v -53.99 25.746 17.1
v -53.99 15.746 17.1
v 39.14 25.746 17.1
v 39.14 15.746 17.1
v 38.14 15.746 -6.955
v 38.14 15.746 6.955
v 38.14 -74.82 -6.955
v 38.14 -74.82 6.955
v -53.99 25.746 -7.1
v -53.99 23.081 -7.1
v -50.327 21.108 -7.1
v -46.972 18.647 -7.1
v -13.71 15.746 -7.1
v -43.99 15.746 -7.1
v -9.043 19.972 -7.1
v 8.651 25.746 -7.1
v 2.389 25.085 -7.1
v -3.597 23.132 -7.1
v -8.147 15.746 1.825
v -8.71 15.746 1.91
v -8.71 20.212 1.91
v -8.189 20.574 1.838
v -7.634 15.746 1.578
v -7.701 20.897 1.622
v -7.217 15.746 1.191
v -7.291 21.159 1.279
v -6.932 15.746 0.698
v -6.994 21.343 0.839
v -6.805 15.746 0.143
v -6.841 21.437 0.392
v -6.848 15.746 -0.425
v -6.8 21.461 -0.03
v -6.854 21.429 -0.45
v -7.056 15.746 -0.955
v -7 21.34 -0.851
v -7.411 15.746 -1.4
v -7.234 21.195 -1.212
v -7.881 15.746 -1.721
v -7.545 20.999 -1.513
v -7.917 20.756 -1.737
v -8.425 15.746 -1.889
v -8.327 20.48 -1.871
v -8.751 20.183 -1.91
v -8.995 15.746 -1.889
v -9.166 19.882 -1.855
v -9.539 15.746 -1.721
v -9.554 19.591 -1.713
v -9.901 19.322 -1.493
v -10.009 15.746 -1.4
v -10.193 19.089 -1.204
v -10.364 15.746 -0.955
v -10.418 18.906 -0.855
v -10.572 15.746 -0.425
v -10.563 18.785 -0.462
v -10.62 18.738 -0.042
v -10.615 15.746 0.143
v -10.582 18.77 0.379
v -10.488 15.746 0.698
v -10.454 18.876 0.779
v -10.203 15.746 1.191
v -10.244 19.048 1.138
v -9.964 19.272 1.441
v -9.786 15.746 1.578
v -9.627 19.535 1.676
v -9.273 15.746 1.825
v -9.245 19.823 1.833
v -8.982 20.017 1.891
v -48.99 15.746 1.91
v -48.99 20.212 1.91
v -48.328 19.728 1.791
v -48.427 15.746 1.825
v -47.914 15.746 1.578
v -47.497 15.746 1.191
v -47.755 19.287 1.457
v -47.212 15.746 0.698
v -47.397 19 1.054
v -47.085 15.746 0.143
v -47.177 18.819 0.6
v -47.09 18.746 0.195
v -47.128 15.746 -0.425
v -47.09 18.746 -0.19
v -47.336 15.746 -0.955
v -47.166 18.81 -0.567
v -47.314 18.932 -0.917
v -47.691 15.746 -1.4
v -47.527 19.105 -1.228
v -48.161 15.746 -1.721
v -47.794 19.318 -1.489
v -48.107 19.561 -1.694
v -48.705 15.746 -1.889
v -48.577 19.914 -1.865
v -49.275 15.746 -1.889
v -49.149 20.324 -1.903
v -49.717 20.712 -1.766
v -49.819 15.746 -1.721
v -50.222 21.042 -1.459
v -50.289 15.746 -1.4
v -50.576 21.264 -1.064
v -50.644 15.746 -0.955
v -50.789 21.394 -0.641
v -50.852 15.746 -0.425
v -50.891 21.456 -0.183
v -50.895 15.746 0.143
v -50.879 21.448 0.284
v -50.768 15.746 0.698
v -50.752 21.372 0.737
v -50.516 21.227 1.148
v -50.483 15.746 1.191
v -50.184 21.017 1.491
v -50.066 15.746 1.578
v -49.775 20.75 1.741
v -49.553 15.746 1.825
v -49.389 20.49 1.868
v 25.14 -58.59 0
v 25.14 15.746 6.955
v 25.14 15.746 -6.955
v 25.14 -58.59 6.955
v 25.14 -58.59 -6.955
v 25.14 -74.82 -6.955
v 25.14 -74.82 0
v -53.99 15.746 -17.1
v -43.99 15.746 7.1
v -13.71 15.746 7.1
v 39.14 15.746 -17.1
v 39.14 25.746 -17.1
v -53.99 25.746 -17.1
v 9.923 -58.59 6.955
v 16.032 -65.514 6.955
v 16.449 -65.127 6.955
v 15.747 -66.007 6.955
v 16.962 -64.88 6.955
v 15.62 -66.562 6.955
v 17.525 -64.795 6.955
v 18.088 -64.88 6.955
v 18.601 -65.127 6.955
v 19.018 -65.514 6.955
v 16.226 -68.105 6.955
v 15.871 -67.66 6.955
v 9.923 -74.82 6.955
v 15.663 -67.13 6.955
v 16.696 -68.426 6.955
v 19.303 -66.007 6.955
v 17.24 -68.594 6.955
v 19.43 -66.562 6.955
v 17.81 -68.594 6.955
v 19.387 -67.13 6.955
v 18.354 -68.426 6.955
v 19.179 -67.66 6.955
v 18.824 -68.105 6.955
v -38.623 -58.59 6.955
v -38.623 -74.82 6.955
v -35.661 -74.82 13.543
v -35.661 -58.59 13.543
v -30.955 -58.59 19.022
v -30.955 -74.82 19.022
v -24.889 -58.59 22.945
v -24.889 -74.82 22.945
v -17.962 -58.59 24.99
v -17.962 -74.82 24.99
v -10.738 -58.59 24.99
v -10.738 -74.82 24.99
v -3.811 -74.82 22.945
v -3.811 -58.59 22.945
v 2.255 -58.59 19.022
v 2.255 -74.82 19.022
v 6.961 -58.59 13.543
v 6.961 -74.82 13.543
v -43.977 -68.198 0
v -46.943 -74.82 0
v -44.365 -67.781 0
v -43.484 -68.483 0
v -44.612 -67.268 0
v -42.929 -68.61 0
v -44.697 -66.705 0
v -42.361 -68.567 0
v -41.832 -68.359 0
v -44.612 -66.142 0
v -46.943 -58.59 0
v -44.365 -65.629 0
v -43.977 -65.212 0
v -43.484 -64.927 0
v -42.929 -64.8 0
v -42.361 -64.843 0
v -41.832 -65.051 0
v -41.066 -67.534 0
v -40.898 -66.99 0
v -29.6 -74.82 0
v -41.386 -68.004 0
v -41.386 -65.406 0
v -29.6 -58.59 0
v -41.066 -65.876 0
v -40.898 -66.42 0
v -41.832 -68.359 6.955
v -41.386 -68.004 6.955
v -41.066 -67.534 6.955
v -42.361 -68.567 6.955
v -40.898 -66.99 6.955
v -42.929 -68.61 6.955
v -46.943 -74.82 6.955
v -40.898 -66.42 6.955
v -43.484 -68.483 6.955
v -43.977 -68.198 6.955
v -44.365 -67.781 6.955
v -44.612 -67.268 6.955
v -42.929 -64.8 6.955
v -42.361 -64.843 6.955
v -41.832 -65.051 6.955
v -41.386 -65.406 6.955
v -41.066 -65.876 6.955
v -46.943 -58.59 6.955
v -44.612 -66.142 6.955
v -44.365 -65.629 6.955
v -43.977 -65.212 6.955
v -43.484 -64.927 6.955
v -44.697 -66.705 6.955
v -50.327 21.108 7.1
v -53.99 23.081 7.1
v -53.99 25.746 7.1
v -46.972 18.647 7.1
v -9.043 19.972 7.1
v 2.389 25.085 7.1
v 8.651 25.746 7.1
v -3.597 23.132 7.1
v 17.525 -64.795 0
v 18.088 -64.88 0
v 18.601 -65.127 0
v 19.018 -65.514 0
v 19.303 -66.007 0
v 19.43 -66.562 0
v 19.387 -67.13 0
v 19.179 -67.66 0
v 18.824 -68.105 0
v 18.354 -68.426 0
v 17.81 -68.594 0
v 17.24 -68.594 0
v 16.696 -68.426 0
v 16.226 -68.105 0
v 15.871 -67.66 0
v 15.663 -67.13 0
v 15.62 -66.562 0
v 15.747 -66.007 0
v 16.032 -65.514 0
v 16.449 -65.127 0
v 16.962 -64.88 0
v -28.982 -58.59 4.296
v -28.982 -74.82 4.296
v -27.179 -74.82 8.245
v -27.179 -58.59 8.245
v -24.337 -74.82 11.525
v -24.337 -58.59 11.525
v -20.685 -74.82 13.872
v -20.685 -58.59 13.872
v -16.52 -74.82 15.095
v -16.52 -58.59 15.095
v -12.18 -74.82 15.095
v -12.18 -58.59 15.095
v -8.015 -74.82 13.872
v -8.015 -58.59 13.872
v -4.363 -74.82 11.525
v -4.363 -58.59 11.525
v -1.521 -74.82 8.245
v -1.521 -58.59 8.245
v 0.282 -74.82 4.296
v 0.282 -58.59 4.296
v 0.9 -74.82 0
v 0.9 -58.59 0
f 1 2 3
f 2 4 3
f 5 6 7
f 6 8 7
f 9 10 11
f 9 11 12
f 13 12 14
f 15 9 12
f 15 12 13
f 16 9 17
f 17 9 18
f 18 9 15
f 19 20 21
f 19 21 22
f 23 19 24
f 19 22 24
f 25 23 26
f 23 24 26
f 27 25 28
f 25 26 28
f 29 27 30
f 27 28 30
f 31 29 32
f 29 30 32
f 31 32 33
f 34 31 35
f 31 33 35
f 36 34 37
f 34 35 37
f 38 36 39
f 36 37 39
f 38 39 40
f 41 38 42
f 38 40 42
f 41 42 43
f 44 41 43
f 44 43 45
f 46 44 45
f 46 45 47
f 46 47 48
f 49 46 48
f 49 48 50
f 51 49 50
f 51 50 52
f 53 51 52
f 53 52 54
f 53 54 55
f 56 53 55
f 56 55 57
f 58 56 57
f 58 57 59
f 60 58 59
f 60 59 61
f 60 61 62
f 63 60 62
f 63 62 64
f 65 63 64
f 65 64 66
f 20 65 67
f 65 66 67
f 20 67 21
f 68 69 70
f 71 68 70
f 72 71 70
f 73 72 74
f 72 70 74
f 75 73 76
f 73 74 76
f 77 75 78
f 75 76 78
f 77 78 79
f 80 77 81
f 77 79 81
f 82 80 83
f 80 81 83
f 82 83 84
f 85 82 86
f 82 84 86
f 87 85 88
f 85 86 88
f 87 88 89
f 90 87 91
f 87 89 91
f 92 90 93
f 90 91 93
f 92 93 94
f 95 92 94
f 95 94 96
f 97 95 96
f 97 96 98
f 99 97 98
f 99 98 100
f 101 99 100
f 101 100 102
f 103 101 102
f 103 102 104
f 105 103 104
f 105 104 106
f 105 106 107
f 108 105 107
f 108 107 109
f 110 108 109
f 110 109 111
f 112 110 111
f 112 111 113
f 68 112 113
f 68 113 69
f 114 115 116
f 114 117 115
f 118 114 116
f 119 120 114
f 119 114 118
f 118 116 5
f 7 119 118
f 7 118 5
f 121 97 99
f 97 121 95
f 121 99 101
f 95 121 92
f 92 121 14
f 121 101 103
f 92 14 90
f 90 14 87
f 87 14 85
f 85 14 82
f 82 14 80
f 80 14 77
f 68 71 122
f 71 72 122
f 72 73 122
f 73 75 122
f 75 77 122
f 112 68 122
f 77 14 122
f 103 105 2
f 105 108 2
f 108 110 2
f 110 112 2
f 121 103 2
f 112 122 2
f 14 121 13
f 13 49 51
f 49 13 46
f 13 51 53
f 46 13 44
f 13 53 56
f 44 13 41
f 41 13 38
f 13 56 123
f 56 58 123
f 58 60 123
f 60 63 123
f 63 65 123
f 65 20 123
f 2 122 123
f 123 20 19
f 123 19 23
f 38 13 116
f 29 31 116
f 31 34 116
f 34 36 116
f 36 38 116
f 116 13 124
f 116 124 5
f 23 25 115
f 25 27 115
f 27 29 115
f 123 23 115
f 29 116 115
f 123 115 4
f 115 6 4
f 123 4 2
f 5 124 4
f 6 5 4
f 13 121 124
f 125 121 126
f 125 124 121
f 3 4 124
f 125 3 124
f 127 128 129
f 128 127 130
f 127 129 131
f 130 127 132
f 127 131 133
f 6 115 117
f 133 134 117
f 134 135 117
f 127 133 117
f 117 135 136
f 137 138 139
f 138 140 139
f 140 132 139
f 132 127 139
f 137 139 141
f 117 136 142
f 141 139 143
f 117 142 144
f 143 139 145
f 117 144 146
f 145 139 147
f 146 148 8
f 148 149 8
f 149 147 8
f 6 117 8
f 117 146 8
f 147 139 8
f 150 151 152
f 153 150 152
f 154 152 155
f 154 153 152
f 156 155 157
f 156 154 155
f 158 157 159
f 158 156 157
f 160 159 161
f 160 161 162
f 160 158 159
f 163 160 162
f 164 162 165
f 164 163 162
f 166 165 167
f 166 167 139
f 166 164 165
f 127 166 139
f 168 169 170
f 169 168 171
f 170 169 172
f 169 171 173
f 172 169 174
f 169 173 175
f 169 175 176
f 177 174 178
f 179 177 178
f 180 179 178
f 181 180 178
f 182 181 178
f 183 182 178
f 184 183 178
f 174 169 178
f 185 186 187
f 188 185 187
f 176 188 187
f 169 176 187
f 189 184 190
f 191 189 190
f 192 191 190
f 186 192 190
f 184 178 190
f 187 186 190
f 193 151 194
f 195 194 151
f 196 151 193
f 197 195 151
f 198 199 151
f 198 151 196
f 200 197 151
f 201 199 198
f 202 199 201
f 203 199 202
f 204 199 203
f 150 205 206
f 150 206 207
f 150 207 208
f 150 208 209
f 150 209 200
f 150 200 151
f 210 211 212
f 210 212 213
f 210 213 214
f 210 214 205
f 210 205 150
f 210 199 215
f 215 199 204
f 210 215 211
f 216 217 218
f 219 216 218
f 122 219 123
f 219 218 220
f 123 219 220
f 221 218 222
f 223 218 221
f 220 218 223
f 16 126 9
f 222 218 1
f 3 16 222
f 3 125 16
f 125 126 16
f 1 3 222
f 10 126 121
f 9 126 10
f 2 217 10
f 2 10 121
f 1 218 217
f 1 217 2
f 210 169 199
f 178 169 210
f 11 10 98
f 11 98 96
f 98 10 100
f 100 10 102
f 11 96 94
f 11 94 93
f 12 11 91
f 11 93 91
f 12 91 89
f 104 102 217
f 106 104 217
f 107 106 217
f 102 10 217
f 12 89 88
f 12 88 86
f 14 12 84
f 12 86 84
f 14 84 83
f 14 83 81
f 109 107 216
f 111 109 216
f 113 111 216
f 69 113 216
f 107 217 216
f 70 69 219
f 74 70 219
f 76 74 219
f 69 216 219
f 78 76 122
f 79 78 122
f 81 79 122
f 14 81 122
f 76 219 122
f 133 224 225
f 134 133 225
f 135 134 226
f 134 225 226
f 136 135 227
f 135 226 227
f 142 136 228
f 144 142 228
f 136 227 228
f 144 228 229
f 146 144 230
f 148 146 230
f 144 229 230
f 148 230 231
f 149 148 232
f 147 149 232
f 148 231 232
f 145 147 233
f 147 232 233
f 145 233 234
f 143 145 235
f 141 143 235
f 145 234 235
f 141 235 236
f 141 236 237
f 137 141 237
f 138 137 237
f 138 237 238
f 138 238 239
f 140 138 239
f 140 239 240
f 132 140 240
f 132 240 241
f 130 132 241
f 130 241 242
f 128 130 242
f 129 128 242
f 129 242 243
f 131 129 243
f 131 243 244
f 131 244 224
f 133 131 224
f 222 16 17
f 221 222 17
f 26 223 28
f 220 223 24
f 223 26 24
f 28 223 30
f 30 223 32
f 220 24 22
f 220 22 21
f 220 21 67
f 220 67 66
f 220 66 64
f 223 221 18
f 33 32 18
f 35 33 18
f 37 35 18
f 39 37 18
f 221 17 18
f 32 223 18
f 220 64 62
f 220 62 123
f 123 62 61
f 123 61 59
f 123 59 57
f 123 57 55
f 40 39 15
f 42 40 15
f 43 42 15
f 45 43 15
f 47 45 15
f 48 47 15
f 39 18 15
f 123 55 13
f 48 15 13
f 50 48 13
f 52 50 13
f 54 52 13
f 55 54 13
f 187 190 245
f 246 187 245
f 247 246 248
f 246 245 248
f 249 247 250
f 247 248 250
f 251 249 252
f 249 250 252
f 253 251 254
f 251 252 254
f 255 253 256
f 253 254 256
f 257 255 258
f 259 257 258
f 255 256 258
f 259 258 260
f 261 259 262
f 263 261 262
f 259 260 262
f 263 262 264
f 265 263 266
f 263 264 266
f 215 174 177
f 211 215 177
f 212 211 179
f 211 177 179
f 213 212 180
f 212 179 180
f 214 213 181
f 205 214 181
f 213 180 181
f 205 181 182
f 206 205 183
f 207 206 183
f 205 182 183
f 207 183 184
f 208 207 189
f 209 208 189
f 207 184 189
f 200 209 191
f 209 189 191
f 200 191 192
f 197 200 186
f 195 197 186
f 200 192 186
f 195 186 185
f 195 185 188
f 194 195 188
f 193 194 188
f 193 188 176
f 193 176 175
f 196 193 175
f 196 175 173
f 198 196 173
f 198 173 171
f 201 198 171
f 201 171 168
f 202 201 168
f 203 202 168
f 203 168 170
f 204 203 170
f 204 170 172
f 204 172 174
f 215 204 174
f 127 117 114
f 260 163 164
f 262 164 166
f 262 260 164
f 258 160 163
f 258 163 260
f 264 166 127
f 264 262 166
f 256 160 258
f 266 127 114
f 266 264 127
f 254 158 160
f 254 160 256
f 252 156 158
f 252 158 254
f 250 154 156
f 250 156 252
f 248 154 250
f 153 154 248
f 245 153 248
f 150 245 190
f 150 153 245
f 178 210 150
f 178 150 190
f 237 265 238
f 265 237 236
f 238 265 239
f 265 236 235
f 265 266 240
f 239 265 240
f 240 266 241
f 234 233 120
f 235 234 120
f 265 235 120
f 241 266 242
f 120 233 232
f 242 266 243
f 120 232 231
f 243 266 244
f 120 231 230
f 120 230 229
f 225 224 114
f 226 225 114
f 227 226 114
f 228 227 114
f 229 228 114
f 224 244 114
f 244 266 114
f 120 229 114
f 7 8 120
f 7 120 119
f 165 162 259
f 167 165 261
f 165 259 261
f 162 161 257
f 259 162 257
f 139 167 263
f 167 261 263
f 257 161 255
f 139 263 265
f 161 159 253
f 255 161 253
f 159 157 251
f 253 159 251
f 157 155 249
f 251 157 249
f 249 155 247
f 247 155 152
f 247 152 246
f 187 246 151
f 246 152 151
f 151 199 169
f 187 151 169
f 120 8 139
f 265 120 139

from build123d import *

# Parameters (mm, degrees)
SKETCH_1_W                = 50.28
SKETCH_1_H                = 34.2
SKETCH_1_W_2              = 30.28
SKETCH_1_H_2              = 14.2
EXTRUDE_1_DEPTH           = 12.25
SKETCH_4_W                = 13
SKETCH_4_H                = 13.91
EXTRUDE_1_2_DEPTH         = 74.82
SKETCH_5_W                = 13.91
SKETCH_5_H                = 16.23
EXTRUDE_2_DEPTH           = 16
SKETCH_7_R                = 25.25
SKETCH_7_R_2              = 15.25
EXTRUDE_2_2_DEPTH         = 16.23
SKETCH_15_R               = 1.91
CUT_EXTRUDE_6_DEPTH       = 97.964478439
SKETCH_18_W               = 49.344544624
SKETCH_18_H               = 6.125
CUT_EXTRUDE_8_DEPTH       = 101.789238284
SKETCH_19_W               = 34.2
SKETCH_19_H               = 6.125
CUT_EXTRUDE_9_DEPTH       = 10
SKETCH_21_R               = 1.91
CUT_EXTRUDE_10_DEPTH      = 10
SKETCH_20_R               = 1.91
CUT_EXTRUDE_11_DEPTH      = 10
FILLET_START              = -7.1
FILLET_1_DEPTH            = 14.2
FILLET_2_DEPTH            = 14.2
SKETCH_29_W               = 13.91
SKETCH_29_H               = 74.82
EXTRUDE_5_DEPTH           = 10
SKETCH_30_W               = 10
SKETCH_30_H               = 58.59
CUT_EXTRUDE_13_DEPTH      = 97.964478439
SKETCH_32_W               = 34.2
SKETCH_32_H               = 5.745736365
EXTRUDE_6_DEPTH           = 10
CUT_EXTRUDE_16_DEPTH      = 50
CUT_EXTRUDE_16_DEPTH_BACK = 50
SKETCH_38_W               = 116.985630298
SKETCH_38_H               = 80.538350638
SKETCH_41_W               = 13.91
SKETCH_41_H               = 5.745736365
EXTRUDE_7_DEPTH           = 3
SKETCH_42_W               = 13
SKETCH_42_H               = 13.91
EXTRUDE_8_DEPTH           = 74.82
SKETCH_43_W               = 13.91
SKETCH_43_H               = 16.23
EXTRUDE_9_DEPTH           = 15.22
SKETCH_44_R               = 1.91
CUT_EXTRUDE_17_DEPTH      = 15.22
SKETCH_46_R               = 25.25
SKETCH_46_R_2             = 15.25
EXTRUDE_6_2_DEPTH         = 16.23
EXTRUDE_10_DEPTH          = 7.22
EXTRUDE_10_DEPTH_BACK     = 10
SKETCH_47_W               = 13.91
SKETCH_47_H               = 16.23
SKETCH_50_W               = 3.056753925
SKETCH_50_H               = 16.23
CUT_EXTRUDE_18_DEPTH      = 96.578211037
SKETCH_51_R               = 1.91
CUT_EXTRUDE_19_DEPTH      = 95.015226304
SKETCH_52_W               = 92.841945613
SKETCH_52_H               = 30
CUT_EXTRUDE_20_DEPTH      = 84.840694713
CUT_EXTRUDE_22_DEPTH      = 50
CUT_EXTRUDE_22_DEPTH_BACK = 50
SKETCH_53_W               = 63.541345486
SKETCH_53_H               = 14.170740414
SKETCH_54_W               = 10
SKETCH_54_H               = 10.145
CUT_EXTRUDE_23_DEPTH      = 50
SKETCH_55_W               = 13
SKETCH_55_H               = 13.91
EXTRUDE_11_DEPTH          = 10
SKETCH_57_W               = 15
SKETCH_57_H               = 34.2
EXTRUDE_12_DEPTH          = 10
SKETCH_58_W               = 34.2
SKETCH_58_H               = 10
EXTRUDE_13_DEPTH          = 27.85
SKETCH_60_W               = 34.2
SKETCH_60_H               = 10
EXTRUDE_14_DEPTH          = 50.28
SKETCH_62_W               = 30.28
SKETCH_62_H               = 14.2
CUT_EXTRUDE_24_DEPTH      = 50.28
SKETCH_64_R               = 1.91
CUT_EXTRUDE_25_DEPTH      = 10
FILLET_3_R                = 30


with BuildPart() as part:
    # 草圖1 → Extrude 1 (new body)
    with BuildSketch(Plane(origin=(0, 0, 0), x_dir=(1, 0, 0), z_dir=(0, 1, 0))):
        Rectangle(SKETCH_1_W, SKETCH_1_H)
        Rectangle(SKETCH_1_W_2, SKETCH_1_H_2, mode=Mode.SUBTRACT)
    extrude(amount=EXTRUDE_1_DEPTH)

    # 草圖4 → Extrude 1 2 (add)
    with BuildSketch(Plane.XZ):
        with Locations((18.64, 0)):
            Rectangle(SKETCH_4_W, SKETCH_4_H)
    extrude(amount=EXTRUDE_1_2_DEPTH)

    # 草圖5 → Extrude 2 (add)
    with BuildSketch(Plane.ZY.offset(-12.14)):
        with Locations((0, -66.705)):
            Rectangle(SKETCH_5_W, SKETCH_5_H)
    extrude(amount=EXTRUDE_2_DEPTH)

    # 草圖7 → Extrude 2 2 (add)
    with BuildSketch(Plane(origin=(3.626674765, -74.82, 0), x_dir=(1, 0, 0), z_dir=(0, -1, 0))):
        with Locations((-30.978154344, 0)):
            Circle(SKETCH_7_R)
        with Locations((-30.978154344, 0)):
            Circle(SKETCH_7_R_2, mode=Mode.SUBTRACT)
    extrude(amount=-EXTRUDE_2_2_DEPTH)

    # 草圖15 → 除料-伸長6 (cut, through all)
    with BuildSketch(Plane(origin=(0, 0, -6.955), x_dir=(-1, 0, 0), z_dir=(0, 0, -1))):
        with Locations((-4.530883248, -66.705)):
            Circle(SKETCH_15_R)
    extrude(amount=-CUT_EXTRUDE_6_DEPTH, mode=Mode.SUBTRACT)

    # 草圖18 → 除料-伸長8 (cut, through all)
    with BuildSketch(Plane(origin=(0, 0, -17.1), x_dir=(-1, 0, 0), z_dir=(0, 0, -1))):
        with Locations((0.467727688, 9.1875)):
            Rectangle(SKETCH_18_W, SKETCH_18_H)
    extrude(amount=-CUT_EXTRUDE_8_DEPTH, mode=Mode.SUBTRACT)

    # 草圖19 → 除料-伸長9 (cut)
    with BuildSketch(Plane.ZY.offset(-24.204544624)):
        with Locations((0, 9.1875)):
            Rectangle(SKETCH_19_W, SKETCH_19_H)
    extrude(amount=-CUT_EXTRUDE_9_DEPTH, mode=Mode.SUBTRACT)

    # 草圖21 → 除料-伸長10 (cut)
    with BuildSketch(Plane(origin=(0, 6.125, 0), x_dir=(1, 0, 0), z_dir=(0, 1, 0))):
        with Locations(Location((17.69, 0, 0), (0, 0, 270))):
            Circle(SKETCH_21_R)
    extrude(amount=-CUT_EXTRUDE_10_DEPTH, mode=Mode.SUBTRACT)

    # 草圖20 → 除料-伸長11 (cut)
    with BuildSketch(Plane(origin=(0, 6.125, 0), x_dir=(1, 0, 0), z_dir=(0, 1, 0))):
        with Locations(Location((-17.395, 0, 0), (0, 0, 270))):
            Circle(SKETCH_20_R)
    extrude(amount=-CUT_EXTRUDE_11_DEPTH, mode=Mode.SUBTRACT)

    # 圓角1: read off the stored shape, not the designer's step
    # 圓角1 outline → 圓角1 (cut)
    with BuildSketch(Plane.XY.offset(FILLET_START)):
        with BuildLine():
            add(Edge.make_bspline(
                [(-15.14, 0), (-21.974170252, 5.199829476), (-25.14, 5.745736365)],
                knots=[0, 0, 0, 0.664102345, 0.664102345, 0.664102345], degree=2, weights=[1, 2.223777218, 1.822127795]))
            Line((-15.14, 0), (-15.14, 6.125))
            Line((-15.14, 6.125), (-25.14, 6.125))
            Line((-25.14, 6.125), (-25.14, 5.745736365))
        make_face()
    extrude(amount=FILLET_1_DEPTH, mode=Mode.SUBTRACT)

    # 圓角2: read off the stored shape, not the designer's step
    # 圓角2 outline → 圓角2 (cut)
    with BuildSketch(Plane.XY.offset(FILLET_START)):
        with BuildLine():
            Line((15.14, 6.125), (15.14, 0))
            add(Edge.make_bspline(
                [(15.14, 0), (21.974170252, 5.199829476), (25.14, 5.745736365)],
                knots=[0, 0, 0, 0.664102345, 0.664102345, 0.664102345], degree=2, weights=[1, 2.223777218, 1.822127795]))
            Line((25.14, 5.745736365), (25.14, 6.125))
            Line((25.14, 6.125), (15.14, 6.125))
        make_face()
    extrude(amount=FILLET_2_DEPTH, mode=Mode.SUBTRACT)

    # 草圖29 → 填料-伸長5 (add)
    with BuildSketch(Plane(origin=(25.14, 0, 0), x_dir=(0, 0, -1), z_dir=(1, 0, 0))):
        with Locations((0, -37.41)):
            Rectangle(SKETCH_29_W, SKETCH_29_H)
    extrude(amount=EXTRUDE_5_DEPTH)

    # 草圖30 → 除料-伸長13 (cut, through all)
    with BuildSketch(Plane.XY.offset(6.955)):
        with Locations((17.14, -29.295)):
            Rectangle(SKETCH_30_W, SKETCH_30_H)
    extrude(amount=-CUT_EXTRUDE_13_DEPTH, mode=Mode.SUBTRACT)

    # 草圖32 → Extrude 6 (add)
    with BuildSketch(Plane(origin=(25.14, 0, 0), x_dir=(0, 0, -1), z_dir=(1, 0, 0))):
        with Locations((0, 2.872868182)):
            Rectangle(SKETCH_32_W, SKETCH_32_H)
    extrude(amount=EXTRUDE_6_DEPTH)

    # 草圖38 → 除料-伸長16 (cut, two sides: drawn at the far end of the back side and taken through both)
    with BuildSketch(Plane(origin=(0, 0, -6.955), x_dir=(-1, 0, 0), z_dir=(0, 0, -1)).offset(-CUT_EXTRUDE_16_DEPTH_BACK)):
        with Locations((7.268869252, -40.269175319)):
            Rectangle(SKETCH_38_W, SKETCH_38_H)
    extrude(amount=CUT_EXTRUDE_16_DEPTH + CUT_EXTRUDE_16_DEPTH_BACK, mode=Mode.SUBTRACT)

    # 草圖41 → 填料-伸長7 (add)
    with BuildSketch(Plane(origin=(35.14, 0, 0), x_dir=(0, 0, -1), z_dir=(1, 0, 0))):
        with Locations((0, 2.872868182)):
            Rectangle(SKETCH_41_W, SKETCH_41_H)
    extrude(amount=EXTRUDE_7_DEPTH)

    # 草圖42 → 填料-伸長8 (add)
    with BuildSketch(Plane(origin=(0, 0, 0), x_dir=(-1, 0, 0), z_dir=(0, -1, 0))):
        with Locations((-31.64, 0)):
            Rectangle(SKETCH_42_W, SKETCH_42_H)
    extrude(amount=EXTRUDE_8_DEPTH)

    # 草圖43 → 填料-伸長9 (add)
    with BuildSketch(Plane.ZY.offset(-25.14)):
        with Locations((0, -66.705)):
            Rectangle(SKETCH_43_W, SKETCH_43_H)
    extrude(amount=EXTRUDE_9_DEPTH)

    # 草圖44 → 除料-伸長17 (cut)
    with BuildSketch(Plane(origin=(0, 0, -6.955), x_dir=(-1, 0, 0), z_dir=(0, 0, -1))):
        with Locations(Location((-17.524895264, -66.705, 0), (0, 0, 90))):
            Circle(SKETCH_44_R)
    extrude(amount=-CUT_EXTRUDE_17_DEPTH, mode=Mode.SUBTRACT)

    # 草圖46 → Extrude 6 2 (add)
    with BuildSketch(Plane(origin=(0, -58.59, 0), x_dir=(1, 0, 0), z_dir=(0, 1, 0))):
        with Locations((-14.35, 0)):
            Circle(SKETCH_46_R)
        with Locations((-14.35, 0)):
            Circle(SKETCH_46_R_2, mode=Mode.SUBTRACT)
    extrude(amount=-EXTRUDE_6_2_DEPTH)

    # 草圖47 → 填料-伸長10 (add, two sides: drawn at the far end of the back side and taken through both)
    with BuildSketch(Plane(origin=(-40, 0, 0), x_dir=(0, 0, -1), z_dir=(1, 0, 0)).offset(-EXTRUDE_10_DEPTH_BACK)):
        with Locations((0, -66.705)):
            Rectangle(SKETCH_47_W, SKETCH_47_H)
    extrude(amount=EXTRUDE_10_DEPTH + EXTRUDE_10_DEPTH_BACK)

    # 草圖50 → 除料-伸長18 (cut, through all)
    with BuildSketch(Plane(origin=(0, 0, -6.955), x_dir=(-1, 0, 0), z_dir=(0, 0, -1))):
        with Locations((48.471623038, -66.705)):
            Rectangle(SKETCH_50_W, SKETCH_50_H)
    extrude(amount=-CUT_EXTRUDE_18_DEPTH, mode=Mode.SUBTRACT)

    # 草圖51 → 除料-伸長19 (cut, through all)
    with BuildSketch(Plane(origin=(0, 0, -6.955), x_dir=(-1, 0, 0), z_dir=(0, 0, -1))):
        with Locations((42.786508152, -66.705)):
            Circle(SKETCH_51_R)
    extrude(amount=-CUT_EXTRUDE_19_DEPTH, mode=Mode.SUBTRACT)

    # 草圖52 → 除料-伸長20 (cut, through all)
    with BuildSketch(Plane(origin=(0, -58.59, 0), x_dir=(1, 0, 0), z_dir=(0, 1, 0))):
        with Locations((-21.280972807, 15)):
            Rectangle(SKETCH_52_W, SKETCH_52_H)
    extrude(amount=-CUT_EXTRUDE_20_DEPTH, mode=Mode.SUBTRACT)

    # 草圖53 → 除料-伸長22 (cut, two sides: drawn at the far end of the back side and taken through both)
    with BuildSketch(Plane(origin=(0, 0, -6.955), x_dir=(-1, 0, 0), z_dir=(0, 0, -1)).offset(-CUT_EXTRUDE_22_DEPTH_BACK)):
        with Locations((6.630672743, -0.960370207)):
            Rectangle(SKETCH_53_W, SKETCH_53_H)
    extrude(amount=CUT_EXTRUDE_22_DEPTH + CUT_EXTRUDE_22_DEPTH_BACK, mode=Mode.SUBTRACT)

    # 草圖54 → 除料-伸長23 (cut)
    with BuildSketch(Plane(origin=(0, 5.745736365, 0), x_dir=(1, 0, 0), z_dir=(0, 1, 0))):
        with Locations((30.14, -12.0275)):
            Rectangle(SKETCH_54_W, SKETCH_54_H)
        with Locations((30.14, 12.0275)):
            Rectangle(SKETCH_54_W, SKETCH_54_H)
    extrude(amount=-CUT_EXTRUDE_23_DEPTH, mode=Mode.SUBTRACT)

    # 草圖55 → 填料-伸長11 (add)
    with BuildSketch(Plane(origin=(0, 5.745736365, 0), x_dir=(1, 0, 0), z_dir=(0, 1, 0))):
        with Locations((31.64, 0)):
            Rectangle(SKETCH_55_W, SKETCH_55_H)
    extrude(amount=EXTRUDE_11_DEPTH)

    # 草圖57 → 填料-伸長12 (add)
    with BuildSketch(Plane(origin=(0, 15.745736365, 0), x_dir=(1, 0, 0), z_dir=(0, 1, 0))):
        with Locations((31.64, 0)):
            Rectangle(SKETCH_57_W, SKETCH_57_H)
    extrude(amount=EXTRUDE_12_DEPTH)

    # 草圖58 → 填料-伸長13 (add)
    with BuildSketch(Plane.ZY.offset(-24.14)):
        with Locations((0, 20.745736365)):
            Rectangle(SKETCH_58_W, SKETCH_58_H)
    extrude(amount=EXTRUDE_13_DEPTH)

    # 草圖60 → 填料-伸長14 (add)
    with BuildSketch(Plane.ZY.offset(3.71)):
        with Locations((0, 20.745736365)):
            Rectangle(SKETCH_60_W, SKETCH_60_H)
    extrude(amount=EXTRUDE_14_DEPTH)

    # 草圖62 → 除料-伸長24 (cut)
    with BuildSketch(Plane(origin=(0, 25.745736365, 0), x_dir=(1, 0, 0), z_dir=(0, 1, 0))):
        with Locations((-28.85, 0)):
            Rectangle(SKETCH_62_W, SKETCH_62_H)
    extrude(amount=-CUT_EXTRUDE_24_DEPTH, mode=Mode.SUBTRACT)

    # 草圖64 → 除料-伸長25 (cut)
    with BuildSketch(Plane(origin=(0, 25.745736365, 0), x_dir=(1, 0, 0), z_dir=(0, 1, 0))):
        with Locations(Location((-8.71, 0, 0), (0, 0, 270))):
            Circle(SKETCH_64_R)
        with Locations(Location((-48.99, 0, 0), (0, 0, 270))):
            Circle(SKETCH_64_R)
    extrude(amount=-CUT_EXTRUDE_25_DEPTH, mode=Mode.SUBTRACT)

    # 圓角3
    # the kernel refuses this fillet: 30 mm, written as the material it takes off along each edge
    with BuildSketch(Plane(origin=(-43.99, 25.745736365, 7.1), x_dir=(-1, 0, 0), z_dir=(0, 0, -1)), Plane(origin=(-13.71, 25.745736365, -7.1), x_dir=(1, 0, 0), z_dir=(0, 0, 1))) as fillet_3_piece_1:
        with BuildLine():
            CenterArc((22.360679775, -30), FILLET_3_R, 90, 48.189685104)
            Line((0, -10), (0, 0))
            Line((0, 0), (22.360679775, 0))
        make_face()
    extrude(amount=14.2, mode=Mode.SUBTRACT)


solid = part.part
